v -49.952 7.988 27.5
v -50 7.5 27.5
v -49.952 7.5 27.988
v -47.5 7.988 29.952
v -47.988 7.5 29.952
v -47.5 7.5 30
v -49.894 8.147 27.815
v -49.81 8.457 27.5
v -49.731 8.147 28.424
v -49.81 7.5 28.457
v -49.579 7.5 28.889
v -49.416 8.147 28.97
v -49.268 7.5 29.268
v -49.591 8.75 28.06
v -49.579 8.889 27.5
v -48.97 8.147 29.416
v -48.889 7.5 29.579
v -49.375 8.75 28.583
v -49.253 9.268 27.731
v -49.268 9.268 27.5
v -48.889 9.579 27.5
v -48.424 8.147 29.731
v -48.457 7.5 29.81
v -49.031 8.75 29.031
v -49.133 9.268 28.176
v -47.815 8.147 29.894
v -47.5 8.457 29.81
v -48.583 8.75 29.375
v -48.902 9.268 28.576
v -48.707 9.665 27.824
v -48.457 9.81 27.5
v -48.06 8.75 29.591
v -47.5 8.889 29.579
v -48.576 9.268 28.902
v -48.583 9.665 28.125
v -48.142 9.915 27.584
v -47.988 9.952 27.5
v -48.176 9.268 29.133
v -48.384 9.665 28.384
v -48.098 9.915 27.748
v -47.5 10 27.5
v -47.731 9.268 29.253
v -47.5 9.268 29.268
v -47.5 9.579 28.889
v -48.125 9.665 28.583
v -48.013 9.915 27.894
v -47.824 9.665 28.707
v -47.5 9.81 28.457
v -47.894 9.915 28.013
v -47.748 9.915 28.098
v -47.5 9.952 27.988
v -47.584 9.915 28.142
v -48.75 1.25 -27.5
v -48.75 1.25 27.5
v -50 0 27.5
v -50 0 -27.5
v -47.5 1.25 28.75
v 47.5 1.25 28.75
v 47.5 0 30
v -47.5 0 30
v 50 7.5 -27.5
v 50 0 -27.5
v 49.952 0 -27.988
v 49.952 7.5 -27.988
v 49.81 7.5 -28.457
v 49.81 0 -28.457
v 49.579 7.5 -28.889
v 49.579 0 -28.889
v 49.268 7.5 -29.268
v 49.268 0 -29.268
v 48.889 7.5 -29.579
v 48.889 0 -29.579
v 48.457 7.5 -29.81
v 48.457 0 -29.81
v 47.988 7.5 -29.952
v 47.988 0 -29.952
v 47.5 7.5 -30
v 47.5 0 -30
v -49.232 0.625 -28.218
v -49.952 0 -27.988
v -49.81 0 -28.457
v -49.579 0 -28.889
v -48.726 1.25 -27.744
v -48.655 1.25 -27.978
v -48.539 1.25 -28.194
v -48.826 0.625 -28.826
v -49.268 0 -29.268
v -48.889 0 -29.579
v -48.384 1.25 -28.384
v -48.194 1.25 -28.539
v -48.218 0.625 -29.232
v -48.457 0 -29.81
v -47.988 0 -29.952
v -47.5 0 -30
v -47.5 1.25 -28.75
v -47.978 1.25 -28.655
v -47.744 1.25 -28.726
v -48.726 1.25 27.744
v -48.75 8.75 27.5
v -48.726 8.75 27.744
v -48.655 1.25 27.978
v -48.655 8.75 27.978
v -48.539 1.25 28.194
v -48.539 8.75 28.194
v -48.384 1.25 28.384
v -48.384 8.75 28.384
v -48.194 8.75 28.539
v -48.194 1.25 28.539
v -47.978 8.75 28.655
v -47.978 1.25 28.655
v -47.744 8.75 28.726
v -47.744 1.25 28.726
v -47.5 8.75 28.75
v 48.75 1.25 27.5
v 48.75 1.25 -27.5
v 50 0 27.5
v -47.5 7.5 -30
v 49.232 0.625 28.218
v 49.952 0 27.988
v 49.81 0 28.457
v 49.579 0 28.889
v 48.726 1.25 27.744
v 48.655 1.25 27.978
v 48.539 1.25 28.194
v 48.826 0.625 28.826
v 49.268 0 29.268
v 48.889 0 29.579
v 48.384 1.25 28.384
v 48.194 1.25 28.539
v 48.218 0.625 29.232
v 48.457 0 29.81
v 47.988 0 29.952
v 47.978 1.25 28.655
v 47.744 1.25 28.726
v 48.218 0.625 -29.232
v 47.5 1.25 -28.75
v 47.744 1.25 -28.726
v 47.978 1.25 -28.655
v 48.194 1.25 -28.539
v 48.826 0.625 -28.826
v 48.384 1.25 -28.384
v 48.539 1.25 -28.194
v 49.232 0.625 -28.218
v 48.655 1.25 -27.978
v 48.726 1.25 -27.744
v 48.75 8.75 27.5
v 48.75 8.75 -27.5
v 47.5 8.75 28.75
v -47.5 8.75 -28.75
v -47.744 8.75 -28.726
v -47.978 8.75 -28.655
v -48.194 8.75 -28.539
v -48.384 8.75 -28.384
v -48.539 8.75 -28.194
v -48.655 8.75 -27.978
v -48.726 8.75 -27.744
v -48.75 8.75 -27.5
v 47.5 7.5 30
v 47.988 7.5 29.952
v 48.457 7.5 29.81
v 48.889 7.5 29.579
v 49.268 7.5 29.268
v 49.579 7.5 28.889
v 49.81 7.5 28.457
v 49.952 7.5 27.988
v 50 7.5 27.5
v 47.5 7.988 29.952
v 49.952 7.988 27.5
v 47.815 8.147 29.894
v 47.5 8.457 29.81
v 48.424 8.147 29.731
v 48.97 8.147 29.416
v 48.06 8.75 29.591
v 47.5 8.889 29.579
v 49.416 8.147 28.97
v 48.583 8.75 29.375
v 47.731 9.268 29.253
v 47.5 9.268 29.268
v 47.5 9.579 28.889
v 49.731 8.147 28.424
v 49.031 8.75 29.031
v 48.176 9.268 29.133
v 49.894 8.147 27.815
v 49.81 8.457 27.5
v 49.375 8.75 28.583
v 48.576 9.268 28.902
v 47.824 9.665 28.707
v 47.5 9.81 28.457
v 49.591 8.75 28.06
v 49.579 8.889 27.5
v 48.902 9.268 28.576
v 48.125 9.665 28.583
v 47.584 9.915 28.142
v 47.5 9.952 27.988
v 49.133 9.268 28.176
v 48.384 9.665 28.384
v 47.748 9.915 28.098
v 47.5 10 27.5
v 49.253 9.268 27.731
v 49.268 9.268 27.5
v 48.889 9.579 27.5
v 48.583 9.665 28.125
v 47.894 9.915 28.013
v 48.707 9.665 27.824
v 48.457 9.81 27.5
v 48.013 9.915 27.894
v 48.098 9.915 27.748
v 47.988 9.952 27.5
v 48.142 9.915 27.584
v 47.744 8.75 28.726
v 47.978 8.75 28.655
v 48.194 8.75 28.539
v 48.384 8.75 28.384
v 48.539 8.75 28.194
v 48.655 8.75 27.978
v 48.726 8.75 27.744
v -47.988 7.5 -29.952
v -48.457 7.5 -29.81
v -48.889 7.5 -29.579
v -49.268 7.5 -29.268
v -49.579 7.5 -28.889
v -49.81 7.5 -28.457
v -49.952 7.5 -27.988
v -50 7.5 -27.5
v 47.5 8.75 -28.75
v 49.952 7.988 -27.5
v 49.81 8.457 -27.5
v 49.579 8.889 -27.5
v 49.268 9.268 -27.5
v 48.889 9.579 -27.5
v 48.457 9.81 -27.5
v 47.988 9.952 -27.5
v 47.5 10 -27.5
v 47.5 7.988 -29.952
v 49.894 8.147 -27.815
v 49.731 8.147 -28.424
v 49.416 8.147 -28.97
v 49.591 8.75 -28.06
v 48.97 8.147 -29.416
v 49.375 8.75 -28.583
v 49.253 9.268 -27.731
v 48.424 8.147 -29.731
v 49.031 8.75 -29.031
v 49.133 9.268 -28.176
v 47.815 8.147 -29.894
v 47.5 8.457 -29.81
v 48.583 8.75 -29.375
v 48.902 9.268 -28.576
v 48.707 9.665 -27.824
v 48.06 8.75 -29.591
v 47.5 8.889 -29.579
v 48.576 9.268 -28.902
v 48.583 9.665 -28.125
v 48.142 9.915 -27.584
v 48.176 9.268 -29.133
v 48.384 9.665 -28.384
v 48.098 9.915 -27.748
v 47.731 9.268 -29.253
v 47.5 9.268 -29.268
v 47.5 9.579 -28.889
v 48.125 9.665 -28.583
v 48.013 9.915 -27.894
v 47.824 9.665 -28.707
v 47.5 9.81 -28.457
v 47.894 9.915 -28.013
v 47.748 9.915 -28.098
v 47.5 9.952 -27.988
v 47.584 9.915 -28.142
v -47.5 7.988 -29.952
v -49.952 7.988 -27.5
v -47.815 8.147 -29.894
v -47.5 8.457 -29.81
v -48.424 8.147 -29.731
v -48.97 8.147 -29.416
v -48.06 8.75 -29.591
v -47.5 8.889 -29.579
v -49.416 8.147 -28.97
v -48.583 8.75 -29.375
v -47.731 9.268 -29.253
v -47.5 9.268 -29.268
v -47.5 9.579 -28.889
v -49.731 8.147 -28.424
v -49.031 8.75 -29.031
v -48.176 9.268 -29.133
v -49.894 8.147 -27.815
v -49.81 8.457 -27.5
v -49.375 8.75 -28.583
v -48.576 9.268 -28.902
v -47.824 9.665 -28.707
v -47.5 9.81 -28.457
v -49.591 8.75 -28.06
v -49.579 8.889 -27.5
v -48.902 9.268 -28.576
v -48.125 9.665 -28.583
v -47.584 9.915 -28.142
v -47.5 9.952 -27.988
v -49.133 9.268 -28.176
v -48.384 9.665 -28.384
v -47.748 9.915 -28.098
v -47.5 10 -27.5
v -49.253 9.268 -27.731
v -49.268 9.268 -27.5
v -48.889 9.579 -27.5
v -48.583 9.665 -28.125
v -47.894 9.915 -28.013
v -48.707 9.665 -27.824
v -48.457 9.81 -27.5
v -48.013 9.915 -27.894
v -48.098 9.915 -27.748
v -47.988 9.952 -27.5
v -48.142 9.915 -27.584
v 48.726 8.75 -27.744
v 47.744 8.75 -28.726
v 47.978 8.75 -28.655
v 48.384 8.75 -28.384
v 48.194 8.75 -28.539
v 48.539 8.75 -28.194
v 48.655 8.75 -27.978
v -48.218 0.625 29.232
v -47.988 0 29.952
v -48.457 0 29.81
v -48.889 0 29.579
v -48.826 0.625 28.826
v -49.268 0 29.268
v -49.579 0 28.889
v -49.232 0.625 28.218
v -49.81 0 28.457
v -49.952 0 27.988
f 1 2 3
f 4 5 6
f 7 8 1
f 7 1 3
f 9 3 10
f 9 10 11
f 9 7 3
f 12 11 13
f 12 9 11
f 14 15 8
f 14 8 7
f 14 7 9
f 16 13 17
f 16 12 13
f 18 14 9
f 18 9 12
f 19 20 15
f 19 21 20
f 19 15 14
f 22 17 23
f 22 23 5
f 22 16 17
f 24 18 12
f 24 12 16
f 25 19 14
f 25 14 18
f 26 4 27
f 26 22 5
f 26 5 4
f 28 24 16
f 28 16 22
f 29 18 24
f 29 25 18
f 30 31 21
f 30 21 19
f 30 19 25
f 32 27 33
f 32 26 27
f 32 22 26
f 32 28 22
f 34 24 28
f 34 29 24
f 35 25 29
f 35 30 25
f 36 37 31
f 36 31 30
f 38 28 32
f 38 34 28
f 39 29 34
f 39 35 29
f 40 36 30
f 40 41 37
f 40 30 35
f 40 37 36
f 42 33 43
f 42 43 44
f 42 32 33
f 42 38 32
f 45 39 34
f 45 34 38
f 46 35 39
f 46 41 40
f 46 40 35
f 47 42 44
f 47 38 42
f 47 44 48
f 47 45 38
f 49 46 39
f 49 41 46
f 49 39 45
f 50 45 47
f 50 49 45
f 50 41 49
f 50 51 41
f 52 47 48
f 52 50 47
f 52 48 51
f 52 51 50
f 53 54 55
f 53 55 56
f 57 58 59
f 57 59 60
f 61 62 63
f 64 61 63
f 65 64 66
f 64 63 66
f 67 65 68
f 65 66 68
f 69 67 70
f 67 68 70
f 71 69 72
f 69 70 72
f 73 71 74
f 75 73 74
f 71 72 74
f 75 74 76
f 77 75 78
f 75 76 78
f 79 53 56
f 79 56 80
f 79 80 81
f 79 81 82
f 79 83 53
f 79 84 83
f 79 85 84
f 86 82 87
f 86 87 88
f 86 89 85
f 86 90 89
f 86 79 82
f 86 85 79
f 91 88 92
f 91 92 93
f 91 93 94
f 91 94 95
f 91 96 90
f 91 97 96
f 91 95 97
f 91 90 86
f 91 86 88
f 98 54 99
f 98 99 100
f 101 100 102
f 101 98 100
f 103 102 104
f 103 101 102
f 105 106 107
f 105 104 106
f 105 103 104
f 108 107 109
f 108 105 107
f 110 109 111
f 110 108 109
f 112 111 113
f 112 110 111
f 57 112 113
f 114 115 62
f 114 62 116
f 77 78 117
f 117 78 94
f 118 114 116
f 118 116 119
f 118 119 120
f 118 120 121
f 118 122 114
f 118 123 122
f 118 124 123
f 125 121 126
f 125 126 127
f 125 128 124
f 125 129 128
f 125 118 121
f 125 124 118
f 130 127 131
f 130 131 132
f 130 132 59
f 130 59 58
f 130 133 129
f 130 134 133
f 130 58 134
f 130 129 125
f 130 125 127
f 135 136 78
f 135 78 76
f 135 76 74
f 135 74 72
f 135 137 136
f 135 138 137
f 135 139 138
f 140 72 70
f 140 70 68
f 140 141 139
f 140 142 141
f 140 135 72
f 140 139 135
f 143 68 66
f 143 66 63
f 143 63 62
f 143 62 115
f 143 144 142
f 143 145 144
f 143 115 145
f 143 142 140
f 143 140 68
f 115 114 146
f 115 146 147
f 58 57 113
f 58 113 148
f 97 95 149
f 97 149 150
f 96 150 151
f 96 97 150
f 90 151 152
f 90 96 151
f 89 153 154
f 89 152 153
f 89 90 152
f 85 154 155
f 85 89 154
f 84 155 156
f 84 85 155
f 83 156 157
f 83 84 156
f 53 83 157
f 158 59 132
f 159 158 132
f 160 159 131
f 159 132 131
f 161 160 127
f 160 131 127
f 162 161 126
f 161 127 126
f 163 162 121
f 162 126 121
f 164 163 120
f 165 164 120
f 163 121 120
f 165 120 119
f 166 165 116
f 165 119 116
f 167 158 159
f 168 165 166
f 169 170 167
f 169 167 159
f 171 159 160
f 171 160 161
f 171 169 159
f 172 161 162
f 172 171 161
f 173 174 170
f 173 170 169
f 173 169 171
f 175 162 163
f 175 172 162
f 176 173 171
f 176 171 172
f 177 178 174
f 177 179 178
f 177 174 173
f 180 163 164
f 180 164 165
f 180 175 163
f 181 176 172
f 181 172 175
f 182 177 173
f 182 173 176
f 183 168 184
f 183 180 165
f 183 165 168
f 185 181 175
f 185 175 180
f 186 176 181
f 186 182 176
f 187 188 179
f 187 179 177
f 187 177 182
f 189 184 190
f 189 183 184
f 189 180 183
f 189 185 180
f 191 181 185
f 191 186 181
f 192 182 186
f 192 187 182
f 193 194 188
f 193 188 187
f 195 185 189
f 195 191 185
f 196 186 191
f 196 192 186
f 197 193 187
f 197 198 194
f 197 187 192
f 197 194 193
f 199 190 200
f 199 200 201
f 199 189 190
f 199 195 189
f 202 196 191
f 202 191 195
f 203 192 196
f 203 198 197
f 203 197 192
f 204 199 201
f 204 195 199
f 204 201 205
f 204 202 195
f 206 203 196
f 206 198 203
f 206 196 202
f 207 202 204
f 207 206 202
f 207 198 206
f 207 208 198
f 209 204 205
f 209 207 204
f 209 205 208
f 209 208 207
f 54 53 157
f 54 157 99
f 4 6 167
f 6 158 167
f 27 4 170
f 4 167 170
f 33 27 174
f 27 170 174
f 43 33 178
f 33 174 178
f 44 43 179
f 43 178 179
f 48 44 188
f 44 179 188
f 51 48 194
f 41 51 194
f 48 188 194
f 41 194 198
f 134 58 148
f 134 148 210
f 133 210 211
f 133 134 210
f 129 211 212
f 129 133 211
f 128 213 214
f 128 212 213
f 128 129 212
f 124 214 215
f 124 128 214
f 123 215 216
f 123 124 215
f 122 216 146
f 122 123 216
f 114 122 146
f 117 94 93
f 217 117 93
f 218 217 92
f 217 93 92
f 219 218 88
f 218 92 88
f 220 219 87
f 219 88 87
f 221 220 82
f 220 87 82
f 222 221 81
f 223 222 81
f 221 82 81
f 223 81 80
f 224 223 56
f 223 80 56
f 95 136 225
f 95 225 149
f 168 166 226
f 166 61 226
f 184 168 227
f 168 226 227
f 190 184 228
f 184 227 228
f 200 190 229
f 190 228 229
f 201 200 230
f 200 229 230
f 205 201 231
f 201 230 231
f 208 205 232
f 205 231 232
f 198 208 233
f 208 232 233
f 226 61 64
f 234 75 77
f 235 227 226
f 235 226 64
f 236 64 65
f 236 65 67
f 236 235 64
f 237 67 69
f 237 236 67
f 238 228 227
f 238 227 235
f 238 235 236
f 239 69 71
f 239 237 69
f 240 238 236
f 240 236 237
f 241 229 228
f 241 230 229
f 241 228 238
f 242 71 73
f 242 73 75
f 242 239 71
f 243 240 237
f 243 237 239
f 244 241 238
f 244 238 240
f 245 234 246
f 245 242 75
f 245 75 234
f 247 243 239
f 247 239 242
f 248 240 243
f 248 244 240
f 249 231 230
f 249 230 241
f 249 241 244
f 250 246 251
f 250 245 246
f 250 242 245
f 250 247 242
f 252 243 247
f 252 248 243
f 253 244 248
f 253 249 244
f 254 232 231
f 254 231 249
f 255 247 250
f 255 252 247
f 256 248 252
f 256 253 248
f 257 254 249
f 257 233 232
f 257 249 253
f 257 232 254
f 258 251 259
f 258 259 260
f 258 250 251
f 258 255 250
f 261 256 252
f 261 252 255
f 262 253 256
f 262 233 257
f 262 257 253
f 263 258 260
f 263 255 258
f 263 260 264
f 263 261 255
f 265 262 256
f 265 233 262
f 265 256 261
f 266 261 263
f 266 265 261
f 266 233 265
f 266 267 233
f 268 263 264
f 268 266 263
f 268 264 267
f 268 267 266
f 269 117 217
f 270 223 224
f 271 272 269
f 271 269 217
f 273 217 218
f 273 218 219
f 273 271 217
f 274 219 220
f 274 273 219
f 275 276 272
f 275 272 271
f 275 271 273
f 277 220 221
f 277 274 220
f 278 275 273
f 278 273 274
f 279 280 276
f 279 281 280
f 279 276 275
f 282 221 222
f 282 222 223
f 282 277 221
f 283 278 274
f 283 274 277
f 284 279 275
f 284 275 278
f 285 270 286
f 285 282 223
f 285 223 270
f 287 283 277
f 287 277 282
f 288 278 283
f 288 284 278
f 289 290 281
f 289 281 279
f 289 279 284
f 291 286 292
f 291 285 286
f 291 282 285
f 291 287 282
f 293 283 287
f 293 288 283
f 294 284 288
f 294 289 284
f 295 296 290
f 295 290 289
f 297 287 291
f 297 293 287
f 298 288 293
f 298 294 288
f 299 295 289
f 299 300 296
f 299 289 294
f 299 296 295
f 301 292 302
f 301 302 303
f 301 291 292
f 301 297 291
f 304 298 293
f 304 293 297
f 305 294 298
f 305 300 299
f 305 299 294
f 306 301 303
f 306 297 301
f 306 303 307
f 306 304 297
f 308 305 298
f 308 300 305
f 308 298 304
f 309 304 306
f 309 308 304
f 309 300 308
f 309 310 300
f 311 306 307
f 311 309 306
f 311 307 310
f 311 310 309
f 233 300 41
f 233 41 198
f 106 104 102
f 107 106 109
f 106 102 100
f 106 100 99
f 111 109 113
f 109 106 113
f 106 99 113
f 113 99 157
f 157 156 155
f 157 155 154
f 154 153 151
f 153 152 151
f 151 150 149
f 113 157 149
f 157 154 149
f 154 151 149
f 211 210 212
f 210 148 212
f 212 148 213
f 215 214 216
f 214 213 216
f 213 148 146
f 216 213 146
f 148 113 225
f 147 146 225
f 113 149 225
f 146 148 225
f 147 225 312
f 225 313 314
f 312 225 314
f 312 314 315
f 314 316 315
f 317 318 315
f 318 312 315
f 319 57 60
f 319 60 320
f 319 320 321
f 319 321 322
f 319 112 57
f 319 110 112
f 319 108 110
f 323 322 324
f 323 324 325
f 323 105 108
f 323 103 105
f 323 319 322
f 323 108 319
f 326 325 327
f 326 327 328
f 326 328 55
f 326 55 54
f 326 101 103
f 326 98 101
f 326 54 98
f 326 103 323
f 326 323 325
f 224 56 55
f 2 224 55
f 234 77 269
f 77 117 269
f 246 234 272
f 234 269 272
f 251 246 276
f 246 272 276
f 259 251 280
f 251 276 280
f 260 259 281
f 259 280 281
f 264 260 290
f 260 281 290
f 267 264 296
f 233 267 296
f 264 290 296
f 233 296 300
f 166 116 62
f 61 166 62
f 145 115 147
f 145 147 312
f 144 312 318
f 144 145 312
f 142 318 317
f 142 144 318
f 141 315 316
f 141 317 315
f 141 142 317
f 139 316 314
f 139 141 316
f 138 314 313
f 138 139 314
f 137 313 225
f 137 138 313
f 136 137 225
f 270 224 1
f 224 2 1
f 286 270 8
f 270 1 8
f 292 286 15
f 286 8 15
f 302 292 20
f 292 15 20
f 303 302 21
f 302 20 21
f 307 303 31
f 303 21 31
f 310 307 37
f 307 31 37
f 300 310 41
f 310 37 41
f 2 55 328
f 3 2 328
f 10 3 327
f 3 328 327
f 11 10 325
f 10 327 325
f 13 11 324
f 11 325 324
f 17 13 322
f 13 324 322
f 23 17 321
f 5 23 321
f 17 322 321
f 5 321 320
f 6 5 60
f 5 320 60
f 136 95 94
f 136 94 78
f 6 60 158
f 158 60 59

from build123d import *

# Parameters (mm, degrees)
BOSS_EXTRUDE1_DEPTH = 10
SHELL1_T            = -1.25
FILLET1_R           = 2.5
CHAMFER1_SIZE       = 1.25


with BuildPart() as part:
    # Sketch1 → Boss-Extrude1 (new body)
    with BuildSketch(Plane(origin=(0, 0, 0), x_dir=(1, 0, 0), z_dir=(0, 1, 0))):
        with BuildLine():
            Line((-47.5, -30), (47.5, -30))
            ThreePointArc((47.5, -30), (49.267766953, -29.267766953), (50, -27.5))
            Line((50, -27.5), (50, 27.5))
            ThreePointArc((50, 27.5), (49.267766953, 29.267766953), (47.5, 30))
            Line((47.5, 30), (-47.5, 30))
            ThreePointArc((-47.5, 30), (-49.267766953, 29.267766953), (-50, 27.5))
            Line((-50, 27.5), (-50, -27.5))
            ThreePointArc((-50, -27.5), (-49.267766953, -29.267766953), (-47.5, -30))
        make_face()
    extrude(amount=BOSS_EXTRUDE1_DEPTH)

    # Shell1
    shell1_openings = [part.faces().sort_by_distance(p)[0] for p in [
        (0, 0, 0),
    ]]
    offset(amount=SHELL1_T, openings=shell1_openings, kind=Kind.INTERSECTION)

    # Fillet1
    fillet1_edges = [part.edges().sort_by_distance(p)[0] for p in [
        (49.267766953, 10, 29.267766953),
        (50, 10, 0),
        (49.267766953, 10, -29.267766953),
        (0, 10, -30),
        (-49.267766953, 10, -29.267766953),
        (-50, 10, 0),
        (-49.267766953, 10, 29.267766953),
        (0, 10, 30),
    ]]
    fillet(fillet1_edges, radius=FILLET1_R)

    # Chamfer1
    chamfer1_edges = [part.edges().sort_by_distance(p)[0] for p in [
        (-48.383883476, 0, 28.383883476),
        (0, 0, 28.75),
        (48.383883476, 0, 28.383883476),
        (48.75, 0, 0),
        (48.383883476, 0, -28.383883476),
        (0, 0, -28.75),
        (-48.383883476, 0, -28.383883476),
        (-48.75, 0, 0),
    ]]
    chamfer(chamfer1_edges, length=CHAMFER1_SIZE - 0.0001)  # a hair under: the kernel refuses the full size


solid = part.part
